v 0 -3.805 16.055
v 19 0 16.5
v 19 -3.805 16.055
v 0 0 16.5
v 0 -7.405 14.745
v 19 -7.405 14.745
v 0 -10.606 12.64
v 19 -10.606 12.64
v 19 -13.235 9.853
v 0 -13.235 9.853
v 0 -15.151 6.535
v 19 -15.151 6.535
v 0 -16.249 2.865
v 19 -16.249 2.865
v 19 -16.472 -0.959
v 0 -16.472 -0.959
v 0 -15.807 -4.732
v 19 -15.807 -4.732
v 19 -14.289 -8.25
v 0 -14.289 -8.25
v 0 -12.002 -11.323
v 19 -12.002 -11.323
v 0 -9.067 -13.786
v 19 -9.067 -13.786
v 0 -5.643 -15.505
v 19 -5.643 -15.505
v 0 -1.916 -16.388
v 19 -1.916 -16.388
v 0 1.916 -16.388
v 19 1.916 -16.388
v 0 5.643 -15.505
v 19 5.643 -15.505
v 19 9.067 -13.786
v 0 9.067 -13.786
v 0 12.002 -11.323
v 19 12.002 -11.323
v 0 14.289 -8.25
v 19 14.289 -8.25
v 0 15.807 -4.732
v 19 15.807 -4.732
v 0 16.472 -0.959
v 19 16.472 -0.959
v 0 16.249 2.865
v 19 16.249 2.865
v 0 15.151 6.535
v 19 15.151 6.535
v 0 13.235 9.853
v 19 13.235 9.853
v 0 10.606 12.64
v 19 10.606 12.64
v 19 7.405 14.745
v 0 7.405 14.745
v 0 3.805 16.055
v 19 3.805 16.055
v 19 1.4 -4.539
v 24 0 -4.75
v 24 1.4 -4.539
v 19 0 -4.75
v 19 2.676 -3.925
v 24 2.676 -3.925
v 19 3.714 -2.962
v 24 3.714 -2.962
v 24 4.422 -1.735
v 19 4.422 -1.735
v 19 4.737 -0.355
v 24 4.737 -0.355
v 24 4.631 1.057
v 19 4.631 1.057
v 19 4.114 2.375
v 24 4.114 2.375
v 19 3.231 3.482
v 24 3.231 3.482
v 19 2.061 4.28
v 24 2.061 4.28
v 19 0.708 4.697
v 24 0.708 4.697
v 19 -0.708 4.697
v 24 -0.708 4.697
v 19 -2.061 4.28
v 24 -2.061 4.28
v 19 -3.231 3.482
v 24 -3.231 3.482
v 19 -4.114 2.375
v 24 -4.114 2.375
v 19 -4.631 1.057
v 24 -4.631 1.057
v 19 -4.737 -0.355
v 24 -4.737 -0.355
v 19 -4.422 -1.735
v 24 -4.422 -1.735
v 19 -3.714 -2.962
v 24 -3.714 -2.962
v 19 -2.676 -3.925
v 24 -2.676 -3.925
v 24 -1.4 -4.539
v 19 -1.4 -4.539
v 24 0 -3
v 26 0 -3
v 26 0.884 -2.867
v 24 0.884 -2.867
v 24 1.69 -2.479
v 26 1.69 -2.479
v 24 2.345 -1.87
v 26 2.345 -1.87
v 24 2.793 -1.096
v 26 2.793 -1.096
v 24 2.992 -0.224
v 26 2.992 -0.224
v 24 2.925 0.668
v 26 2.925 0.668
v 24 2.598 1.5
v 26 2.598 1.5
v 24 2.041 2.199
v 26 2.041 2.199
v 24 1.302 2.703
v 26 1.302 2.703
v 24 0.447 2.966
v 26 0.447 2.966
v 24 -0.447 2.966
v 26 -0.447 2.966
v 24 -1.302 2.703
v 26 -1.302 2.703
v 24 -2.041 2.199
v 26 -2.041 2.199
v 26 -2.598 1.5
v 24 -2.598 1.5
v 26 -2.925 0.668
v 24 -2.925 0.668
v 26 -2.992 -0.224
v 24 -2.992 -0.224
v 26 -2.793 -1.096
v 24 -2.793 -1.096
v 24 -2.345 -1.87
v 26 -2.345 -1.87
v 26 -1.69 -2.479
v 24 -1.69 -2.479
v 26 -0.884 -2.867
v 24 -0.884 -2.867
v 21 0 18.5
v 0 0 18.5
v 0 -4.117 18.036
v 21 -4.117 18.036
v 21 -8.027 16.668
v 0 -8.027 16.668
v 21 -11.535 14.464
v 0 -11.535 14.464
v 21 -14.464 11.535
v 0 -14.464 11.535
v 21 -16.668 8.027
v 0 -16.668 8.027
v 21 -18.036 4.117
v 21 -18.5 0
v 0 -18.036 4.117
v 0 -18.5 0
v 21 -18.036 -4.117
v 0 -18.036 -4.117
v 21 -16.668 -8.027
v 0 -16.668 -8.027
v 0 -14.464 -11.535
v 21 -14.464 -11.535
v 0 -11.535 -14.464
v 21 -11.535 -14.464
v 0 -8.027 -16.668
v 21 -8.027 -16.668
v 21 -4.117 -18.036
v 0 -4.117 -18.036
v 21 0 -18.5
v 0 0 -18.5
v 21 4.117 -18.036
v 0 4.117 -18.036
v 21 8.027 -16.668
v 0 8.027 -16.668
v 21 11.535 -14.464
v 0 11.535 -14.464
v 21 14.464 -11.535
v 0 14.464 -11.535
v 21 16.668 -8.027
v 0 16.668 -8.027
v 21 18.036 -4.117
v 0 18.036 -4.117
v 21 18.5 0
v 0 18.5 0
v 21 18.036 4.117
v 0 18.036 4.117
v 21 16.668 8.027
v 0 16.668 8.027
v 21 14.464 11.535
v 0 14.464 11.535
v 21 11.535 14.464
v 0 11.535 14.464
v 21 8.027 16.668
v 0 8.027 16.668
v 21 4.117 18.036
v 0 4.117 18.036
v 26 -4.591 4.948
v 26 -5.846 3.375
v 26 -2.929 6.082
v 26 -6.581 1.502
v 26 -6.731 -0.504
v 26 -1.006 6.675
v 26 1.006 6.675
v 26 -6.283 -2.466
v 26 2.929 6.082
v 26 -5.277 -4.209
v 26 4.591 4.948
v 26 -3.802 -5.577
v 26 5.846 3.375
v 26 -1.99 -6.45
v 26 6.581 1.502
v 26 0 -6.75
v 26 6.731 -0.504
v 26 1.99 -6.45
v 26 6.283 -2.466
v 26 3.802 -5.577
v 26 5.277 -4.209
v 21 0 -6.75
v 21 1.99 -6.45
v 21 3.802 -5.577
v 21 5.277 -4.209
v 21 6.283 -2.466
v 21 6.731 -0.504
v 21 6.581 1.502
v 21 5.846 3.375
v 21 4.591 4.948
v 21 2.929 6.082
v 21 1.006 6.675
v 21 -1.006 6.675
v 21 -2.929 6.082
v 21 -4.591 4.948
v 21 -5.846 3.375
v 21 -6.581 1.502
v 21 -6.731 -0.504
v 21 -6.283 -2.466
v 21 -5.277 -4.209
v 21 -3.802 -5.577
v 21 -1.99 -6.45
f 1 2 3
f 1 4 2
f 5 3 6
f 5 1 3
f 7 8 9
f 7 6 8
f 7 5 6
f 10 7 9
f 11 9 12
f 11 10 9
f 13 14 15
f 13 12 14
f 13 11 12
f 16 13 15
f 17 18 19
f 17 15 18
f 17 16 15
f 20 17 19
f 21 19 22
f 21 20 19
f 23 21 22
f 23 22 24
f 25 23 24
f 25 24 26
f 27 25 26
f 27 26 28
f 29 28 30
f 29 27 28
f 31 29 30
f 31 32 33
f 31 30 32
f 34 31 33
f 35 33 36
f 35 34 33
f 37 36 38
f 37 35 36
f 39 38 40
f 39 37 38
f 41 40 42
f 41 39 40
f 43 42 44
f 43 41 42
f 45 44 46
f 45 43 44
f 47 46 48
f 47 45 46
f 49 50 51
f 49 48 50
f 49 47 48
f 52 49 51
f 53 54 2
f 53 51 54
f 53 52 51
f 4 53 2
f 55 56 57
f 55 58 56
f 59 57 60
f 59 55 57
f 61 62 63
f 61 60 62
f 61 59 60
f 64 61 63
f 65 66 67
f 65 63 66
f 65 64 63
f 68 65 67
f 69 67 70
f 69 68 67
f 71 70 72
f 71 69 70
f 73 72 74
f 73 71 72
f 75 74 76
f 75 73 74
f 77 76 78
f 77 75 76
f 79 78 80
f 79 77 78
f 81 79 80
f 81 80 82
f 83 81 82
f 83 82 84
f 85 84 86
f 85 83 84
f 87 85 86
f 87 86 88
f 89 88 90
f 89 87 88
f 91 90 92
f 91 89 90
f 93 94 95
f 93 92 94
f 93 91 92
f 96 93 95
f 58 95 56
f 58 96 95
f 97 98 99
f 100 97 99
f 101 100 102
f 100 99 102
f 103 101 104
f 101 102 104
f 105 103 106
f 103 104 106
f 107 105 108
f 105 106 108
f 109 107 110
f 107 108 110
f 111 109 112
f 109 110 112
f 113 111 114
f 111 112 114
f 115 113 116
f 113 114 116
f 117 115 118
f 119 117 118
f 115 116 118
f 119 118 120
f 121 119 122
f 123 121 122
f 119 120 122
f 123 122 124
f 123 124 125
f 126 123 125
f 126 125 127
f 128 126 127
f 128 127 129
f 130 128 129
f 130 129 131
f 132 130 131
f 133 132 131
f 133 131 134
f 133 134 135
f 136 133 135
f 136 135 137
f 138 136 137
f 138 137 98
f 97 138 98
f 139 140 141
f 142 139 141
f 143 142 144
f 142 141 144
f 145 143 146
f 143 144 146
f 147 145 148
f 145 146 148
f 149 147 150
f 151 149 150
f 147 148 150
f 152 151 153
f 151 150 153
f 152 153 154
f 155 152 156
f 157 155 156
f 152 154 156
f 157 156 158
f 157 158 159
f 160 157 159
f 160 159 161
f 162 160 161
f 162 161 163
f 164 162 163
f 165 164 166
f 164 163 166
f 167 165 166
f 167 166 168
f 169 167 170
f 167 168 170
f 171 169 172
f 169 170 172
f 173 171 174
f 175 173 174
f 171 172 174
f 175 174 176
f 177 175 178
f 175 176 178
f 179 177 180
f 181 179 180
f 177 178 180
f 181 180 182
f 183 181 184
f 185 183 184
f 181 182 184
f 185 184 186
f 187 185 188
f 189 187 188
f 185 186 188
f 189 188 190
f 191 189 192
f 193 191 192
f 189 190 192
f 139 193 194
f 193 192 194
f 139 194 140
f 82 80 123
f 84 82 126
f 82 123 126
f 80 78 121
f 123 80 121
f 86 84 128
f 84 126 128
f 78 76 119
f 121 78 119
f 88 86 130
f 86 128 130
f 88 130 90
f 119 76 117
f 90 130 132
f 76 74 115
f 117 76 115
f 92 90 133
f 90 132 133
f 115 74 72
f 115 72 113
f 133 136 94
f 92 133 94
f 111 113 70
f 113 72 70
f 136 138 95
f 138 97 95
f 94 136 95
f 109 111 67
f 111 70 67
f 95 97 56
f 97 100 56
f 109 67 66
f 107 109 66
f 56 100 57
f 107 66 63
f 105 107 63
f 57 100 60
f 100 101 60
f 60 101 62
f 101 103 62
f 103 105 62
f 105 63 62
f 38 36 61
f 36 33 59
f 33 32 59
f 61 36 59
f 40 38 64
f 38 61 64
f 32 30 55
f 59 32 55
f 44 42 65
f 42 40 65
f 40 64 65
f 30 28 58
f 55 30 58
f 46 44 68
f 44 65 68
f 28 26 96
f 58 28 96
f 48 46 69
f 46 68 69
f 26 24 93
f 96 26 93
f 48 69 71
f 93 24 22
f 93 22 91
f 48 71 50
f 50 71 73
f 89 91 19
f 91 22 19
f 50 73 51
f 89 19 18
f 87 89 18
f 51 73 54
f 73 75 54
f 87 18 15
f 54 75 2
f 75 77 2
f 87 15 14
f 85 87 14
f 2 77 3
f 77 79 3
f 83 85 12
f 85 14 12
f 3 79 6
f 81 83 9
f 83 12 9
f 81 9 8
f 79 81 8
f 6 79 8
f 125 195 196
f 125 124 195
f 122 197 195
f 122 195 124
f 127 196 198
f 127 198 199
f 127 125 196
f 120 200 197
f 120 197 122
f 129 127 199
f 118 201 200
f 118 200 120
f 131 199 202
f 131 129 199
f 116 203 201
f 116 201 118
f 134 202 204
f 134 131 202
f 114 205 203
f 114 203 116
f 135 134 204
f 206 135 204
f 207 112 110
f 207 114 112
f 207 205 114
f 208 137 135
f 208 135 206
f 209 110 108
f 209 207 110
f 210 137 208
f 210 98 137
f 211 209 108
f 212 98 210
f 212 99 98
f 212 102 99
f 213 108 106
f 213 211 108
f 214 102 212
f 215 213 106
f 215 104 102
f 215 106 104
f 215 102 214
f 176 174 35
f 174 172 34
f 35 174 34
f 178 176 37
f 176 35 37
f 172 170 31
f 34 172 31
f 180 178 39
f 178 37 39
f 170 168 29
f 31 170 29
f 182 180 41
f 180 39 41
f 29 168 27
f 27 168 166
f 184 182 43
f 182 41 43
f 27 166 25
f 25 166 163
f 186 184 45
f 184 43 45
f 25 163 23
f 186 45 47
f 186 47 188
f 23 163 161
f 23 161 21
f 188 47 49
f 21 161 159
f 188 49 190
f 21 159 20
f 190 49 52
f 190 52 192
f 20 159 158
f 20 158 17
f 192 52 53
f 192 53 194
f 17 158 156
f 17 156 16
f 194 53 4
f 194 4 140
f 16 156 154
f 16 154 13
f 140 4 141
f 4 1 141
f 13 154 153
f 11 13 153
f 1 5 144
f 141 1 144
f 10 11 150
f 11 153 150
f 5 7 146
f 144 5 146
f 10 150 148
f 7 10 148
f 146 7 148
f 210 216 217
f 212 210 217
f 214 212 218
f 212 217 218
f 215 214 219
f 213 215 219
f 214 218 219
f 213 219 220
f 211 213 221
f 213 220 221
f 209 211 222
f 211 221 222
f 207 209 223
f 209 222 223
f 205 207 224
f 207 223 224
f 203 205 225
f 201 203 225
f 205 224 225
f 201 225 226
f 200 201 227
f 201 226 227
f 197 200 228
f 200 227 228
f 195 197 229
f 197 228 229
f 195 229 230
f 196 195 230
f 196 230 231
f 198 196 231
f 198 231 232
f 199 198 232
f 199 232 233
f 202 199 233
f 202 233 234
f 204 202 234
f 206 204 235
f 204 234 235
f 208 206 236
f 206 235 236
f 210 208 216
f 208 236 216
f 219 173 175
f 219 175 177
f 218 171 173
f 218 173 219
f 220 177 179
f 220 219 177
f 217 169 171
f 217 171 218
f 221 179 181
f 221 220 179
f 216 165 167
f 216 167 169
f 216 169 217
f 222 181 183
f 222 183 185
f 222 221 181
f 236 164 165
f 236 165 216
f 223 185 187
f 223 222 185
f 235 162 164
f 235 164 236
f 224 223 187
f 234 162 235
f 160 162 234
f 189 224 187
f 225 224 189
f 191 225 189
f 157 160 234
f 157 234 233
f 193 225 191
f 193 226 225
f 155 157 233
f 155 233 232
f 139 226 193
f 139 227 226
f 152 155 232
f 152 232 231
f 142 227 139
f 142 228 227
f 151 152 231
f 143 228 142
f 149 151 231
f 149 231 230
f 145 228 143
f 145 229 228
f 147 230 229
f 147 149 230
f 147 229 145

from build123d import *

# Parameters (mm, degrees)
SKETCH1_R           = 18.5
BOSS_EXTRUDE1_DEPTH = 21
SKETCH2_R           = 6.75
BOSS_EXTRUDE2_DEPTH = 5
SHELL1_T            = -2
SKETCH3_R           = 3
CUT_EXTRUDE1_DEPTH  = 5


with BuildPart() as part:
    # Sketch1 → Boss-Extrude1 (new body)
    with BuildSketch(Plane(origin=(0, 0, 0), x_dir=(0, 0, -1), z_dir=(1, 0, 0))):
        Circle(SKETCH1_R)
    extrude(amount=BOSS_EXTRUDE1_DEPTH)

    # Sketch2 → Boss-Extrude2 (add)
    with BuildSketch(Plane(origin=(21, 0, 0), x_dir=(0, 0, -1), z_dir=(1, 0, 0))):
        Circle(SKETCH2_R)
    extrude(amount=BOSS_EXTRUDE2_DEPTH)

    # Shell1
    shell1_openings = [part.faces().sort_by_distance(p)[0] for p in [
        (0, 0, 0),
    ]]
    offset(amount=SHELL1_T, openings=shell1_openings, kind=Kind.INTERSECTION)

    # Sketch3 → Cut-Extrude1 (cut)
    with BuildSketch(Plane(origin=(26, 0, 0), x_dir=(0, 0, -1), z_dir=(1, 0, 0))):
        Circle(SKETCH3_R)
    extrude(amount=-CUT_EXTRUDE1_DEPTH, mode=Mode.SUBTRACT)


solid = part.part
